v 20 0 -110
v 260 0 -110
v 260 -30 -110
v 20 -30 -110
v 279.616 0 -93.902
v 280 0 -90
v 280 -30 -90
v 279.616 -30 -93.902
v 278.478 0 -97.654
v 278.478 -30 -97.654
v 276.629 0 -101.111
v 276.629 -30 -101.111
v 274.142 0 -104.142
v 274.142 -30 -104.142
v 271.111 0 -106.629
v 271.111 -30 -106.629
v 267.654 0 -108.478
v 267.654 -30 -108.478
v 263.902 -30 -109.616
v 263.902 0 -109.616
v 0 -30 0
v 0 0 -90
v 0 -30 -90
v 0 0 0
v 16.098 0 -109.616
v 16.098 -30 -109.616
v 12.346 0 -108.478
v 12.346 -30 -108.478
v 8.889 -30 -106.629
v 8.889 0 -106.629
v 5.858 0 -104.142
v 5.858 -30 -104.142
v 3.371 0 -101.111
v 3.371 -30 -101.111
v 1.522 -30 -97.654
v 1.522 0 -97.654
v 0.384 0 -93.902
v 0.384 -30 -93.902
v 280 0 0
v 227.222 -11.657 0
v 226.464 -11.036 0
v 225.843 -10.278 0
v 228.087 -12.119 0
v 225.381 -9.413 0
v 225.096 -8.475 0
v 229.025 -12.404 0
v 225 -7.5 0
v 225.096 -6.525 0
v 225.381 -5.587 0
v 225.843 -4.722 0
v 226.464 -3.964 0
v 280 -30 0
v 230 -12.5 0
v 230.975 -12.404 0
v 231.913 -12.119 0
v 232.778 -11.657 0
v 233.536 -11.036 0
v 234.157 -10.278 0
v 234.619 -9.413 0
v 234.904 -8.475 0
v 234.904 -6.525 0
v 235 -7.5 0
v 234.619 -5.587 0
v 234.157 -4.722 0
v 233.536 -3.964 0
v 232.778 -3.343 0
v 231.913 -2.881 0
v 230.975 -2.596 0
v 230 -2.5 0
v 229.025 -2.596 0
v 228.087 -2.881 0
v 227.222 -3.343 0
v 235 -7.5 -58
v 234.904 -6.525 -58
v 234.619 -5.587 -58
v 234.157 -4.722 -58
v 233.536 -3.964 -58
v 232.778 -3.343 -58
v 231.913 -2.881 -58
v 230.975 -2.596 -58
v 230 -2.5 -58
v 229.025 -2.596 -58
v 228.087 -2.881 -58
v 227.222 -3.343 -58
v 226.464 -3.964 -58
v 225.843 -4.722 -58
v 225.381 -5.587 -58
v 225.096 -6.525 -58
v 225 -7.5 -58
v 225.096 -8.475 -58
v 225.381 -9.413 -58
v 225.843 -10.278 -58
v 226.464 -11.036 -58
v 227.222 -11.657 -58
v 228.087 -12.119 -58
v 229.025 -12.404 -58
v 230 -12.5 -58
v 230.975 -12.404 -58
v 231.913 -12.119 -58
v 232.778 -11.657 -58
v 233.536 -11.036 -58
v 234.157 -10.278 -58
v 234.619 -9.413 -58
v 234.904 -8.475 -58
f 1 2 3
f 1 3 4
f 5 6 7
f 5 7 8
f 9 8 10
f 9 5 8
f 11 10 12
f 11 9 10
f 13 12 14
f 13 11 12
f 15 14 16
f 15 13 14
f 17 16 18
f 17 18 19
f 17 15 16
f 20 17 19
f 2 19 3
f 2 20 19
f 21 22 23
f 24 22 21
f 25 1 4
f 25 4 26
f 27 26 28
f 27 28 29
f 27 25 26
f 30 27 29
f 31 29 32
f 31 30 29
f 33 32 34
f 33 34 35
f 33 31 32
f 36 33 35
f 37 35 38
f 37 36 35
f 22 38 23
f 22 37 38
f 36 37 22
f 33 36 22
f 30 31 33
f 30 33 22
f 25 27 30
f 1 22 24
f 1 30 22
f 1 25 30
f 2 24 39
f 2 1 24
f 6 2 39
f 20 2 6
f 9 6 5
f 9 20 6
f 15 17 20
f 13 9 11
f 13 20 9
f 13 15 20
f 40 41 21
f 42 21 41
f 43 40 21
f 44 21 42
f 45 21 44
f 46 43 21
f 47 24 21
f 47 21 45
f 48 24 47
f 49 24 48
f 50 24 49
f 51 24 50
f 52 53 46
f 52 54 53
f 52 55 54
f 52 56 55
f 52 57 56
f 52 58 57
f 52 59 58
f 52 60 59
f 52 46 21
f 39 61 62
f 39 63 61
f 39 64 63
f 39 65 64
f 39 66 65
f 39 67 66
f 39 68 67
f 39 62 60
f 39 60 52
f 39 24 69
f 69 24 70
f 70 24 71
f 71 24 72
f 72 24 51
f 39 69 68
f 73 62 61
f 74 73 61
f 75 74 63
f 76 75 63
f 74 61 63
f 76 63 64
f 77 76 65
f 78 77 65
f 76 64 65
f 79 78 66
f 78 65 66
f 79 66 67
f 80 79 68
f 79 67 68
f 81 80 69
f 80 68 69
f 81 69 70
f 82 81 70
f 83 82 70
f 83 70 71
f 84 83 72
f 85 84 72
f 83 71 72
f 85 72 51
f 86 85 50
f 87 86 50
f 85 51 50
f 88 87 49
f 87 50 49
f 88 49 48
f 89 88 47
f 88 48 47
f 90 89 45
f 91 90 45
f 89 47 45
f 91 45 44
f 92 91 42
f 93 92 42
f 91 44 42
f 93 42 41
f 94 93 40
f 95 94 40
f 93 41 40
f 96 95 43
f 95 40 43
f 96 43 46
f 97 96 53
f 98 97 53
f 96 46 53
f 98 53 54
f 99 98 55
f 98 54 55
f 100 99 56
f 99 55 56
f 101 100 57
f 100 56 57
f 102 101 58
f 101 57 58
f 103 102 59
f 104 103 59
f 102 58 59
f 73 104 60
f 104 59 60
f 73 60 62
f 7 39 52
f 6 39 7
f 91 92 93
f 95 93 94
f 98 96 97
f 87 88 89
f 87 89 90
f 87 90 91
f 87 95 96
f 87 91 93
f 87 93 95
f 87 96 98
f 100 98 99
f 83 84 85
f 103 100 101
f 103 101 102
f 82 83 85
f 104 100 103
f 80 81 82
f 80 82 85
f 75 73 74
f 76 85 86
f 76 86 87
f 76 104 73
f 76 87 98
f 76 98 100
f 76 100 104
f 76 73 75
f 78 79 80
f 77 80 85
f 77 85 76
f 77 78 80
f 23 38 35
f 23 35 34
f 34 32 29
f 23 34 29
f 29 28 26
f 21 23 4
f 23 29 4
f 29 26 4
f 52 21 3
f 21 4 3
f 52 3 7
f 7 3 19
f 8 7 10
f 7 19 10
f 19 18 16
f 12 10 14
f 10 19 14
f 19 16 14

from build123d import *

# Parameters (mm, degrees)
BOSS_EXTRU_1_DEPTH      = 30
ESQUISSE2_R             = 5
ENL_V_MAT_EXTRU_1_DEPTH = 58


with BuildPart() as part:
    # Esquisse1 → Boss.-Extru.1 (new body)
    with BuildSketch(Plane(origin=(0, 0, 0), x_dir=(1, 0, 0), z_dir=(0, 1, 0))):
        with BuildLine():
            Line((0, 0), (280, 0))
            Line((280, 0), (280, 90))
            ThreePointArc((280, 90), (274.142135624, 104.142135624), (260, 110))
            Line((260, 110), (20, 110))
            ThreePointArc((20, 110), (5.857864376, 104.142135624), (0, 90))
            Line((0, 90), (0, 0))
        make_face()
    extrude(amount=-BOSS_EXTRU_1_DEPTH)

    # Esquisse2 → Enlèv. mat.-Extru.1 (cut)
    with BuildSketch(Plane.XY):
        with Locations((230, -7.5)):
            Circle(ESQUISSE2_R)
    extrude(amount=-ENL_V_MAT_EXTRU_1_DEPTH, mode=Mode.SUBTRACT)


solid = part.part
